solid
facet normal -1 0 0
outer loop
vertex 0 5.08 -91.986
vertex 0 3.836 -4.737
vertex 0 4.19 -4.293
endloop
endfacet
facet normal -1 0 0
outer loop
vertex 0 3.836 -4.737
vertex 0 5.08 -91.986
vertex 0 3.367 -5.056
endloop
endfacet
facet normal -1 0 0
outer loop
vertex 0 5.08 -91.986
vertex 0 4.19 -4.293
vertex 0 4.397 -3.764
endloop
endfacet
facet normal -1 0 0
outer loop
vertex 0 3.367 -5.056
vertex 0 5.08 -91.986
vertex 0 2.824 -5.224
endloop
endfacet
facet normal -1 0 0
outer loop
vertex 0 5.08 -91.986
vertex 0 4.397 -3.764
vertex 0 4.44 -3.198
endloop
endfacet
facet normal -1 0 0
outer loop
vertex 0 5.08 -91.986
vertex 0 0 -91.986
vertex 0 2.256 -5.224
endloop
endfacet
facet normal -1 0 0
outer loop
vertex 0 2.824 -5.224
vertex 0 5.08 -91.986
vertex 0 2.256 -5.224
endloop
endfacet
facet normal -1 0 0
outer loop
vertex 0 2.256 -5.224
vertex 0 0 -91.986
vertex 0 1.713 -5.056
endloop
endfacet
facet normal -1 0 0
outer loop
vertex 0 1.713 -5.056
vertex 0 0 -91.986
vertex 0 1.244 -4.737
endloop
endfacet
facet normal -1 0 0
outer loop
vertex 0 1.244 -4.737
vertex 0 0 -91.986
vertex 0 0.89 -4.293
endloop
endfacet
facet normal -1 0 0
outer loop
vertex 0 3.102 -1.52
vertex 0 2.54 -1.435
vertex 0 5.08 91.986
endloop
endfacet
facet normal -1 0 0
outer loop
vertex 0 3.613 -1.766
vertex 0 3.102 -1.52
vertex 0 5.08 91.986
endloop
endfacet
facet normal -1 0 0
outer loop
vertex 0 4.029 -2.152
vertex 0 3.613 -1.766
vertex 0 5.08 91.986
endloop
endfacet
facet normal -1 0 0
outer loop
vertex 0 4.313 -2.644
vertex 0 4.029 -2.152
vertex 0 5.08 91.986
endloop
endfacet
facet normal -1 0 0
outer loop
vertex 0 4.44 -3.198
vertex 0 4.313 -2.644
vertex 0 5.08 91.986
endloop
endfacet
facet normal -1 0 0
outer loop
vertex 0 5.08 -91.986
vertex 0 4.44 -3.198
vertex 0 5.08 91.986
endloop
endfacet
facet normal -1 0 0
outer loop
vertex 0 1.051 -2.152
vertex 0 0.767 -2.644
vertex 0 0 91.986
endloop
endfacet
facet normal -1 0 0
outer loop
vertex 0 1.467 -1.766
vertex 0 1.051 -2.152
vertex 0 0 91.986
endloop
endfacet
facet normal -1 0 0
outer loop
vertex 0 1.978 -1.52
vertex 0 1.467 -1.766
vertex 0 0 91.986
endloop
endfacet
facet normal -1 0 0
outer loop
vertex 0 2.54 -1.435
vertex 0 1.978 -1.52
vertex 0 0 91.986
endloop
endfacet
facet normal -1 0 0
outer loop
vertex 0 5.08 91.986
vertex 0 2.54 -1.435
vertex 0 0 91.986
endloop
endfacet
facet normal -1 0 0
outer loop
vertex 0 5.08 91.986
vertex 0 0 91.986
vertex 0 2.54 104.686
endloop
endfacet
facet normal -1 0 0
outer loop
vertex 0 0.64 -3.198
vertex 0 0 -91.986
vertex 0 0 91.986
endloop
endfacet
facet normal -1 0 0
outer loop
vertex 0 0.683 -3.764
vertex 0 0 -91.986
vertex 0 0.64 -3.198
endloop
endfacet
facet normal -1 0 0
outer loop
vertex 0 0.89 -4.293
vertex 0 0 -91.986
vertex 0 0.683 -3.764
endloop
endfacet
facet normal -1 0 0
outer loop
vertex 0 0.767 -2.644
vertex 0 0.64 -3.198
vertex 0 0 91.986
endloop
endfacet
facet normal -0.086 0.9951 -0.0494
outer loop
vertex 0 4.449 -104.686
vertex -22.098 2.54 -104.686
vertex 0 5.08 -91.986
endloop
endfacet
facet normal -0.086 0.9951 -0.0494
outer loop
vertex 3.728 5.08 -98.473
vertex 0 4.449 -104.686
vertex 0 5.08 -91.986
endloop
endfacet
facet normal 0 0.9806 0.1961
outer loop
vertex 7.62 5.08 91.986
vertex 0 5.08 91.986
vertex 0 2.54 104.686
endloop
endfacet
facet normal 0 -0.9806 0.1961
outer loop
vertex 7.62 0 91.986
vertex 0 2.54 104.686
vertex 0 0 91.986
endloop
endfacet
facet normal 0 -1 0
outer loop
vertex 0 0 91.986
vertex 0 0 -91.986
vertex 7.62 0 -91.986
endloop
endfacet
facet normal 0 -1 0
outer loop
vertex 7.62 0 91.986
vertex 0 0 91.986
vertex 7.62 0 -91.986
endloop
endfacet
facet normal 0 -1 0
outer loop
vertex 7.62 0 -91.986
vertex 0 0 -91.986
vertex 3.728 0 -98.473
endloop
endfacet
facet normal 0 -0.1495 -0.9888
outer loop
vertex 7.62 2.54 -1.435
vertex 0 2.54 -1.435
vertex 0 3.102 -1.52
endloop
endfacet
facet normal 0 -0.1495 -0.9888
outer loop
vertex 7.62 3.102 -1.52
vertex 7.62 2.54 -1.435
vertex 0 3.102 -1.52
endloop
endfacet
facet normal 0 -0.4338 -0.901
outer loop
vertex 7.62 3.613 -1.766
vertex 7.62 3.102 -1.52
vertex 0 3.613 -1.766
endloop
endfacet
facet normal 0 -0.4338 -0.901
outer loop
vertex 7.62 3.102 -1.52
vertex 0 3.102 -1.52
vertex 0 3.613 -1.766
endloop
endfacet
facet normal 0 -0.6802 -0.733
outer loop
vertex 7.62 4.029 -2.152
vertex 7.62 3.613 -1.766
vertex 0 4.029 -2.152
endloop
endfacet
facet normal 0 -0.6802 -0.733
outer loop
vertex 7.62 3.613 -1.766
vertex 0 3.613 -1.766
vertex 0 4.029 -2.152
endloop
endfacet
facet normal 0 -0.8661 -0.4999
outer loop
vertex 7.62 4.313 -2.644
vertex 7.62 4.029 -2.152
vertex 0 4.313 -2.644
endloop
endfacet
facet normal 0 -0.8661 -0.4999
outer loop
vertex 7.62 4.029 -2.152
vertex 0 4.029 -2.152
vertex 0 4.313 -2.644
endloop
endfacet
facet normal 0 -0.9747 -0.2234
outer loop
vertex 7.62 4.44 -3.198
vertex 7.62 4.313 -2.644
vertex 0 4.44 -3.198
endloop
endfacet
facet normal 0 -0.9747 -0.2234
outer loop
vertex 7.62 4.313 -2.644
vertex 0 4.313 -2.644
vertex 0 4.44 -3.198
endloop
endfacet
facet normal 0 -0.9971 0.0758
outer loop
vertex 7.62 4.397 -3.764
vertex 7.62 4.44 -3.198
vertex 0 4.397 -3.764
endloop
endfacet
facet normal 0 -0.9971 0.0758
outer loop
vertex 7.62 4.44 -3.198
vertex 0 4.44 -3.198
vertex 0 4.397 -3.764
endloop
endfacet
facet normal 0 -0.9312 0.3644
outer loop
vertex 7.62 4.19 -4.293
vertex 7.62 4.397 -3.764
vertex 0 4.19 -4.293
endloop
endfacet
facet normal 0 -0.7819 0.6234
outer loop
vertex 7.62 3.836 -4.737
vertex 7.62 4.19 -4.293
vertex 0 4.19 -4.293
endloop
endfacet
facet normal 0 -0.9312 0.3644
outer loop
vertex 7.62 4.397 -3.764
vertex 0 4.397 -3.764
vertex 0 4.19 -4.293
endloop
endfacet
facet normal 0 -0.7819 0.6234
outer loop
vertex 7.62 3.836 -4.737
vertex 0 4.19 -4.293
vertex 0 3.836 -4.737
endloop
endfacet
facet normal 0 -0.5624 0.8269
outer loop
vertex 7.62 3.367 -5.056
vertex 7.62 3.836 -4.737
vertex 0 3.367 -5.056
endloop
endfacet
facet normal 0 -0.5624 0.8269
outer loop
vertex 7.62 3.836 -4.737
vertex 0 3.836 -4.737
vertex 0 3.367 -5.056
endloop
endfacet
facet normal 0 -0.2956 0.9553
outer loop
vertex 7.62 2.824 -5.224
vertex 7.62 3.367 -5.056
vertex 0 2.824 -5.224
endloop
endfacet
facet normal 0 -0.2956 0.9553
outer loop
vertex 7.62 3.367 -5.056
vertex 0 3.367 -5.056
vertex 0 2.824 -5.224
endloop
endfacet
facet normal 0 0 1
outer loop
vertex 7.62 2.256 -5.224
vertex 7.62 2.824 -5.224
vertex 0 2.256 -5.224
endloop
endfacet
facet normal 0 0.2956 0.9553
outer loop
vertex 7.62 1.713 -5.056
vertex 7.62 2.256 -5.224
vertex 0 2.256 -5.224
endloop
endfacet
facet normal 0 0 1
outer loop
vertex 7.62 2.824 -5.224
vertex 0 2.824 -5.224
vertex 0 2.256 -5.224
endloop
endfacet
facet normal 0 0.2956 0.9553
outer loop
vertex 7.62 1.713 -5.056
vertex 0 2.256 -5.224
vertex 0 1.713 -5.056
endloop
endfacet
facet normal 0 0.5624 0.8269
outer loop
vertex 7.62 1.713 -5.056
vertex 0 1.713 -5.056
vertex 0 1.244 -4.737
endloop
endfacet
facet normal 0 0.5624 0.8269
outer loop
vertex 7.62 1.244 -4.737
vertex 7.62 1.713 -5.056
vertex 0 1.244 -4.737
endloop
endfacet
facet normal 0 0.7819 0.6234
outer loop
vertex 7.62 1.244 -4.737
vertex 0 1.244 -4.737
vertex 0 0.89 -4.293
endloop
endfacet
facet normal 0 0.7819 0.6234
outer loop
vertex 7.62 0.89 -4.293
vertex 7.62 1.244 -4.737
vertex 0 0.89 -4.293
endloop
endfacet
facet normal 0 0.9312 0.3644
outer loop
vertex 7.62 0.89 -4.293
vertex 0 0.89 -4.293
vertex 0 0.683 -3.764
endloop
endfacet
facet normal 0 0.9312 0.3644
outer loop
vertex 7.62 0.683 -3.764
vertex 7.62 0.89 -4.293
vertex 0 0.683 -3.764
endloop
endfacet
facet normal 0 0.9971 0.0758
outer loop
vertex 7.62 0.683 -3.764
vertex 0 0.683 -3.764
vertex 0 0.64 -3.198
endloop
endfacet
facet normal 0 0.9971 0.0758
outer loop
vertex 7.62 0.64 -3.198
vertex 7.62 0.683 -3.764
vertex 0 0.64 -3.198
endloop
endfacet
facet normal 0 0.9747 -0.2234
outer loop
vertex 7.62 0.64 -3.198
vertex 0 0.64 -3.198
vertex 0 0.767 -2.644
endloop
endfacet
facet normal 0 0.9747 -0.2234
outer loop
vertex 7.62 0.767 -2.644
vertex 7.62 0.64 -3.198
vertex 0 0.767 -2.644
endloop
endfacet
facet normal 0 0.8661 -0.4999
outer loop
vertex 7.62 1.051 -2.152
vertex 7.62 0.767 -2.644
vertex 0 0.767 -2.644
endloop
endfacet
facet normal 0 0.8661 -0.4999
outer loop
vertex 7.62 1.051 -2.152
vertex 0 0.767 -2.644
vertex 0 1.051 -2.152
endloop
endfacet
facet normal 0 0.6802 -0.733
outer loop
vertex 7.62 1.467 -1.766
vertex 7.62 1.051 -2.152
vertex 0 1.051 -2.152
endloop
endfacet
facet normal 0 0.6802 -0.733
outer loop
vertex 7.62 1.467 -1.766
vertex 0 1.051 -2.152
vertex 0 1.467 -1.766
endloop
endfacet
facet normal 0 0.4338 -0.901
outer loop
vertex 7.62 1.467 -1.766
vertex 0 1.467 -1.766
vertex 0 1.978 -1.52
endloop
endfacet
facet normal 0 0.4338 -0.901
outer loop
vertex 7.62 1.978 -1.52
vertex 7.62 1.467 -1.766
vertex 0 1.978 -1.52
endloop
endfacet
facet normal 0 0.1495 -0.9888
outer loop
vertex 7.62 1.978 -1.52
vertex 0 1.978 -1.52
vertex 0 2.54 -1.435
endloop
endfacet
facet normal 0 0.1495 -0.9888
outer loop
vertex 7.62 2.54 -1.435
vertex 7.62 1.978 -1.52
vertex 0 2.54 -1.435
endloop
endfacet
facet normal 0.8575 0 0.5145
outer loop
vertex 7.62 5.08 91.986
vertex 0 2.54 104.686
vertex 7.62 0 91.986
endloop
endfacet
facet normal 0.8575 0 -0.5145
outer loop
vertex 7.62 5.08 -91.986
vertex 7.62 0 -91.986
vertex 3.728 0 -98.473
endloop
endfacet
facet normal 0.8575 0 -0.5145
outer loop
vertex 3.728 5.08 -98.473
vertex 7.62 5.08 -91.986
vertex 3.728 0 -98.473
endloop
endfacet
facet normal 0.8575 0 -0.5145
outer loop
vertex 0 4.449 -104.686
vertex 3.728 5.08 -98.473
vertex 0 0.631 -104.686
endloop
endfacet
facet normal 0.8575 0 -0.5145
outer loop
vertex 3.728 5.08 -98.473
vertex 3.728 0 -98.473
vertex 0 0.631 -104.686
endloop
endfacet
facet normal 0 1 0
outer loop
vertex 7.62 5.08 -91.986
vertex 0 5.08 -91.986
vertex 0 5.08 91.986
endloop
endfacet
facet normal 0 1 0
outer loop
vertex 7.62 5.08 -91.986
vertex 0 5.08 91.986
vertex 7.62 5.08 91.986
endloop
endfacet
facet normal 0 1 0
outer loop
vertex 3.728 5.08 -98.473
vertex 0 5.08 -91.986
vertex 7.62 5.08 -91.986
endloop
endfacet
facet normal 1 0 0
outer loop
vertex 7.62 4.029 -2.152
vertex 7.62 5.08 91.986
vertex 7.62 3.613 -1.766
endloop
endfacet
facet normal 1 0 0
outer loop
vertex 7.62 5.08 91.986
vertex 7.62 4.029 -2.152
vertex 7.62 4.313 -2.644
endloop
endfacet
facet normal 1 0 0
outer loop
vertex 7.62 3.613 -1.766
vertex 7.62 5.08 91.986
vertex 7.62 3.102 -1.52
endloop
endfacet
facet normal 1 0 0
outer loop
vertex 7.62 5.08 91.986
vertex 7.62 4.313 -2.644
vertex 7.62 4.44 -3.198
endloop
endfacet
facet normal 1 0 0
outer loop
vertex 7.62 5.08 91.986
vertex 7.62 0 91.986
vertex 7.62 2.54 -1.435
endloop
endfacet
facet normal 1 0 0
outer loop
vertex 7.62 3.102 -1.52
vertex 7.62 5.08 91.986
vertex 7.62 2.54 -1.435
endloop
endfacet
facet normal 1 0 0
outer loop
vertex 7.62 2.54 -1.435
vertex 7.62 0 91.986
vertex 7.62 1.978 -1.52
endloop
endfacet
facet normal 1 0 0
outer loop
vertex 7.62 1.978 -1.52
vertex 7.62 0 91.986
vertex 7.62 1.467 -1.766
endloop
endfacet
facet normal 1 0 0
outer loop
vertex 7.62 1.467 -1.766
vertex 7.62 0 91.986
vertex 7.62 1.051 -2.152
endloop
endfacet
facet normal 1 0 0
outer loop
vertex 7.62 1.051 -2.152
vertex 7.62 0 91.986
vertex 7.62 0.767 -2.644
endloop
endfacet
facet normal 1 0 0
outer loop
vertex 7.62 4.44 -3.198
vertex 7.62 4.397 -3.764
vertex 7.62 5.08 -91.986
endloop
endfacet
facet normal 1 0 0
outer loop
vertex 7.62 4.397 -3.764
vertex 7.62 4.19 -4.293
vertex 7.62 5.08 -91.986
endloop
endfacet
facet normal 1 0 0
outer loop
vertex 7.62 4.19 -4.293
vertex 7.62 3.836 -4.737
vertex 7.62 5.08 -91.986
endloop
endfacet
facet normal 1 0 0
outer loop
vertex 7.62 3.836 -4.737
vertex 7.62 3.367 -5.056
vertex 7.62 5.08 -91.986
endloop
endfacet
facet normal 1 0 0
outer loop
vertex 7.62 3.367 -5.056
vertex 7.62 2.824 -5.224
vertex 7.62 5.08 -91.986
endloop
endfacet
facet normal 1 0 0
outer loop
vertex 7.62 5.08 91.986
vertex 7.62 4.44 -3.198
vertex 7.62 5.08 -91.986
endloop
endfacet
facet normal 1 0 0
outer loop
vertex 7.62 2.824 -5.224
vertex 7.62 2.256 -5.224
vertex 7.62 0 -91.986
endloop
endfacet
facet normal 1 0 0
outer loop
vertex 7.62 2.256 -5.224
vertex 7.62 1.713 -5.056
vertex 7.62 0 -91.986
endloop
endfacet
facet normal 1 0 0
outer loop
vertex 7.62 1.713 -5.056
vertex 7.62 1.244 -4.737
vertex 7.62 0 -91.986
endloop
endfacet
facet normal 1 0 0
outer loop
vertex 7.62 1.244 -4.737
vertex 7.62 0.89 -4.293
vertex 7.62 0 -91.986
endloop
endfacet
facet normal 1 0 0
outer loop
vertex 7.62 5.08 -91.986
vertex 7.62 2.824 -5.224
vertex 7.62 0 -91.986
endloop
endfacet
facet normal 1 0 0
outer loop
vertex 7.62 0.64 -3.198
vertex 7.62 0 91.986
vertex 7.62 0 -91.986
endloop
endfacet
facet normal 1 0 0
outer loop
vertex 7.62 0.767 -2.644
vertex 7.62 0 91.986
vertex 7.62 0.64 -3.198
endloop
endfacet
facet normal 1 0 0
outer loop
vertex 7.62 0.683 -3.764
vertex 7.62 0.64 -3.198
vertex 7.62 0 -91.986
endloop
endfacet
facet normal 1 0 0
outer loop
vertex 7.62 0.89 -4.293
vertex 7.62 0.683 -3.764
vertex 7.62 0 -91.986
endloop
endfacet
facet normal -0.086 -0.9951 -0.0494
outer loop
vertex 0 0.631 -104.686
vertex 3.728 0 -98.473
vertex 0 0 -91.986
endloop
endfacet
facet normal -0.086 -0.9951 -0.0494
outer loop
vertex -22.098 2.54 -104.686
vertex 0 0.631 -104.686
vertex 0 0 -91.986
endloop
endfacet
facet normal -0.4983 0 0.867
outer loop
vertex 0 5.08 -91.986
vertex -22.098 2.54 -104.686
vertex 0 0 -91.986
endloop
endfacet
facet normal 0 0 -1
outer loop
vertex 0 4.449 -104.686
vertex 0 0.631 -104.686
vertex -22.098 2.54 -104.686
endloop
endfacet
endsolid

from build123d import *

# Parameters (mm, degrees)
BOSS_EXTRUDE1_DEPTH     = 5.08
CUT_EXTRUDE1_DEPTH      = 109.941018249
CUT_EXTRUDE1_DEPTH_BACK = 109.941018249
CUT_EXTRUDE2_DEPTH      = 185.574421805
CUT_EXTRUDE2_DEPTH_BACK = 185.574421805
SKETCH4_R               = 1.905
CUT_EXTRUDE3_DEPTH      = 21.336


with BuildPart() as part:
    # Sketch1 → Boss-Extrude1 (new body)
    with BuildSketch(Plane(origin=(0, 0, 0), x_dir=(1, 0, 0), z_dir=(0, 1, 0))):
        Polygon((7.62, -91.9861), (7.62, 91.9861), (0, 104.6861), (0, -104.6861), align=None)
        Polygon((0, 91.9861), (0, 104.6861), (-22.098, 104.6861), align=None)
    extrude(amount=BOSS_EXTRUDE1_DEPTH)

    # Sketch2 → Cut-Extrude1 (cut, two sides: drawn at the far end of the back side and taken through both)
    with BuildSketch(Plane(origin=(7.62, 0, 0), x_dir=(0, 0, -1), z_dir=(1, 0, 0)).offset(-CUT_EXTRUDE1_DEPTH_BACK)):
        Polygon((-104.6861, 5.08), (-91.9861, 5.08), (-104.6861, 2.54), align=None)
        Polygon((-104.6861, 0), (-104.6861, 2.54), (-91.9861, 0), align=None)
    extrude(amount=CUT_EXTRUDE1_DEPTH + CUT_EXTRUDE1_DEPTH_BACK, mode=Mode.SUBTRACT)

    # Sketch3 → Cut-Extrude2 (cut, two sides: drawn at the far end of the back side and taken through both)
    with BuildSketch(Plane(origin=(39.73974923, 0, -69.147163661), x_dir=(0.867013943985018, 0, 0.4982838758534578), z_dir=(-0.4982838758534578, 0, 0.867013943985018)).offset(-CUT_EXTRUDE2_DEPTH_BACK)):
        Polygon((-71.32266979, 2.54), (-45.835190433, 5.08), (-71.32266979, 5.08), align=None)
        Polygon((-45.835190433, 0), (-71.32266979, 2.54), (-71.32266979, 0), align=None)
    extrude(amount=CUT_EXTRUDE2_DEPTH + CUT_EXTRUDE2_DEPTH_BACK, mode=Mode.SUBTRACT)

    # Sketch4 → Cut-Extrude3 (cut)
    with BuildSketch(Plane.ZY):
        with Locations((-3.3401, 2.54)):
            Circle(SKETCH4_R)
    extrude(amount=-CUT_EXTRUDE3_DEPTH, mode=Mode.SUBTRACT)


solid = part.part
